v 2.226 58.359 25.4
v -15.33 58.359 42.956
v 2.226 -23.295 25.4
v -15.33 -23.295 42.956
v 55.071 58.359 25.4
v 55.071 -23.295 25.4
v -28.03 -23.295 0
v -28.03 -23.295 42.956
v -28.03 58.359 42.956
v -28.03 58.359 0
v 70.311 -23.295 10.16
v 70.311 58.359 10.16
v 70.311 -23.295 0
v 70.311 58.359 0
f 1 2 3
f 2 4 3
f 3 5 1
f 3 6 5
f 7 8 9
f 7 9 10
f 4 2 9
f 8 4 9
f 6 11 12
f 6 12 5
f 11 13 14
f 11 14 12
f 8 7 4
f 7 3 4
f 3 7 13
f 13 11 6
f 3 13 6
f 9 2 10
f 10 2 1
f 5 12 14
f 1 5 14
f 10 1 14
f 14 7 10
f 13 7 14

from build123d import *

# Parameters (mm, degrees)
F0_W        = 15.3297632933
F0_H        = 43.554501608
F0_W_2      = 41.3750298321
F0_W_3      = 28.9361141622
F1_DEPTH    = 25.4
F2_W        = 17.5558461342
F2_H        = 43.554501608
F3_DEPTH    = 25.4
F4_SIZE     = 15.24
F5_T4_DEPTH = 174.1959973967
F6_DEPTH    = 12.7
F7_DEPTH    = 25.4
F8_DEPTH    = 12.7


# Not quite as in the source:
# - a fillet or chamfer that OpenCascade refuses, or shapes differently, is made with other operations: its cross-section is extruded or revolved along the edge and cut away or added


with BuildPart() as f1:
    # F0 (on Top) → F1 (new body)
    with BuildSketch(Plane.XY):
        with Locations((-7.6648816466, -1.5181871131)):
            Rectangle(F0_W, F0_H)
        with Locations((20.6875149161, -1.5181871131)):
            Rectangle(F0_W_2, F0_H)
        with Locations((55.8430869132, -1.5181871131)):
            Rectangle(F0_W_3, F0_H)
    extrude(amount=F1_DEPTH)

    # F2 (on face) → F3 (join)
    with BuildSketch(Plane.XY.offset(25.4)):
        with Locations((-6.5518402262, -1.5181871131)):
            Rectangle(F2_W, F2_H)
    extrude(amount=F3_DEPTH)

    # F4
    f4_edges = [f1.edges().sort_by_distance(p)[0] for p in [
        (70.311144, -1.518187, 25.4),
    ]]
    chamfer(f4_edges, length=F4_SIZE)

    # F5: chamfer of 25.4 on 1 edges, made by hand


with BuildPart() as f5_tool2:
    # F5_s3 → F5_t4 (new body)
    with BuildSketch(Plane.XZ.offset(88.6161858114)):
        Polygon((2.2260828409, 25.4), (-23.1739171591, 50.8), (2.2260828409, 50.8), align=None)
    extrude(amount=-F5_T4_DEPTH)

    split(bisect_by=Plane.XY.offset(25.4), keep=Keep.TOP)


with BuildPart() as f1_1:
    add(f1.part)

    # F5_t1: cut F5_tool2
    add(f5_tool2.part, mode=Mode.SUBTRACT)

    # F6 (add): a face of the model
    f6_faces = [f1_1.faces().sort_by_distance(p)[0] for p in [
        (-15.3297632933, -1.5181871131, 21.4779230671),
    ]]
    extrude(f6_faces, amount=F6_DEPTH)

    # F7 (add): a face of the model
    f7_faces = [f1_1.faces().sort_by_distance(p)[0] for p in [
        (14.1137713258, 20.2590636909, 15.1513351417),
    ]]
    extrude(f7_faces, amount=F7_DEPTH)

    # F8 (add): a face of the model
    f8_faces = [f1_1.faces().sort_by_distance(p)[0] for p in [
        (14.1137713258, 45.6590636909, 15.1513351417),
    ]]
    extrude(f8_faces, amount=F8_DEPTH)


solid = f1_1.part
